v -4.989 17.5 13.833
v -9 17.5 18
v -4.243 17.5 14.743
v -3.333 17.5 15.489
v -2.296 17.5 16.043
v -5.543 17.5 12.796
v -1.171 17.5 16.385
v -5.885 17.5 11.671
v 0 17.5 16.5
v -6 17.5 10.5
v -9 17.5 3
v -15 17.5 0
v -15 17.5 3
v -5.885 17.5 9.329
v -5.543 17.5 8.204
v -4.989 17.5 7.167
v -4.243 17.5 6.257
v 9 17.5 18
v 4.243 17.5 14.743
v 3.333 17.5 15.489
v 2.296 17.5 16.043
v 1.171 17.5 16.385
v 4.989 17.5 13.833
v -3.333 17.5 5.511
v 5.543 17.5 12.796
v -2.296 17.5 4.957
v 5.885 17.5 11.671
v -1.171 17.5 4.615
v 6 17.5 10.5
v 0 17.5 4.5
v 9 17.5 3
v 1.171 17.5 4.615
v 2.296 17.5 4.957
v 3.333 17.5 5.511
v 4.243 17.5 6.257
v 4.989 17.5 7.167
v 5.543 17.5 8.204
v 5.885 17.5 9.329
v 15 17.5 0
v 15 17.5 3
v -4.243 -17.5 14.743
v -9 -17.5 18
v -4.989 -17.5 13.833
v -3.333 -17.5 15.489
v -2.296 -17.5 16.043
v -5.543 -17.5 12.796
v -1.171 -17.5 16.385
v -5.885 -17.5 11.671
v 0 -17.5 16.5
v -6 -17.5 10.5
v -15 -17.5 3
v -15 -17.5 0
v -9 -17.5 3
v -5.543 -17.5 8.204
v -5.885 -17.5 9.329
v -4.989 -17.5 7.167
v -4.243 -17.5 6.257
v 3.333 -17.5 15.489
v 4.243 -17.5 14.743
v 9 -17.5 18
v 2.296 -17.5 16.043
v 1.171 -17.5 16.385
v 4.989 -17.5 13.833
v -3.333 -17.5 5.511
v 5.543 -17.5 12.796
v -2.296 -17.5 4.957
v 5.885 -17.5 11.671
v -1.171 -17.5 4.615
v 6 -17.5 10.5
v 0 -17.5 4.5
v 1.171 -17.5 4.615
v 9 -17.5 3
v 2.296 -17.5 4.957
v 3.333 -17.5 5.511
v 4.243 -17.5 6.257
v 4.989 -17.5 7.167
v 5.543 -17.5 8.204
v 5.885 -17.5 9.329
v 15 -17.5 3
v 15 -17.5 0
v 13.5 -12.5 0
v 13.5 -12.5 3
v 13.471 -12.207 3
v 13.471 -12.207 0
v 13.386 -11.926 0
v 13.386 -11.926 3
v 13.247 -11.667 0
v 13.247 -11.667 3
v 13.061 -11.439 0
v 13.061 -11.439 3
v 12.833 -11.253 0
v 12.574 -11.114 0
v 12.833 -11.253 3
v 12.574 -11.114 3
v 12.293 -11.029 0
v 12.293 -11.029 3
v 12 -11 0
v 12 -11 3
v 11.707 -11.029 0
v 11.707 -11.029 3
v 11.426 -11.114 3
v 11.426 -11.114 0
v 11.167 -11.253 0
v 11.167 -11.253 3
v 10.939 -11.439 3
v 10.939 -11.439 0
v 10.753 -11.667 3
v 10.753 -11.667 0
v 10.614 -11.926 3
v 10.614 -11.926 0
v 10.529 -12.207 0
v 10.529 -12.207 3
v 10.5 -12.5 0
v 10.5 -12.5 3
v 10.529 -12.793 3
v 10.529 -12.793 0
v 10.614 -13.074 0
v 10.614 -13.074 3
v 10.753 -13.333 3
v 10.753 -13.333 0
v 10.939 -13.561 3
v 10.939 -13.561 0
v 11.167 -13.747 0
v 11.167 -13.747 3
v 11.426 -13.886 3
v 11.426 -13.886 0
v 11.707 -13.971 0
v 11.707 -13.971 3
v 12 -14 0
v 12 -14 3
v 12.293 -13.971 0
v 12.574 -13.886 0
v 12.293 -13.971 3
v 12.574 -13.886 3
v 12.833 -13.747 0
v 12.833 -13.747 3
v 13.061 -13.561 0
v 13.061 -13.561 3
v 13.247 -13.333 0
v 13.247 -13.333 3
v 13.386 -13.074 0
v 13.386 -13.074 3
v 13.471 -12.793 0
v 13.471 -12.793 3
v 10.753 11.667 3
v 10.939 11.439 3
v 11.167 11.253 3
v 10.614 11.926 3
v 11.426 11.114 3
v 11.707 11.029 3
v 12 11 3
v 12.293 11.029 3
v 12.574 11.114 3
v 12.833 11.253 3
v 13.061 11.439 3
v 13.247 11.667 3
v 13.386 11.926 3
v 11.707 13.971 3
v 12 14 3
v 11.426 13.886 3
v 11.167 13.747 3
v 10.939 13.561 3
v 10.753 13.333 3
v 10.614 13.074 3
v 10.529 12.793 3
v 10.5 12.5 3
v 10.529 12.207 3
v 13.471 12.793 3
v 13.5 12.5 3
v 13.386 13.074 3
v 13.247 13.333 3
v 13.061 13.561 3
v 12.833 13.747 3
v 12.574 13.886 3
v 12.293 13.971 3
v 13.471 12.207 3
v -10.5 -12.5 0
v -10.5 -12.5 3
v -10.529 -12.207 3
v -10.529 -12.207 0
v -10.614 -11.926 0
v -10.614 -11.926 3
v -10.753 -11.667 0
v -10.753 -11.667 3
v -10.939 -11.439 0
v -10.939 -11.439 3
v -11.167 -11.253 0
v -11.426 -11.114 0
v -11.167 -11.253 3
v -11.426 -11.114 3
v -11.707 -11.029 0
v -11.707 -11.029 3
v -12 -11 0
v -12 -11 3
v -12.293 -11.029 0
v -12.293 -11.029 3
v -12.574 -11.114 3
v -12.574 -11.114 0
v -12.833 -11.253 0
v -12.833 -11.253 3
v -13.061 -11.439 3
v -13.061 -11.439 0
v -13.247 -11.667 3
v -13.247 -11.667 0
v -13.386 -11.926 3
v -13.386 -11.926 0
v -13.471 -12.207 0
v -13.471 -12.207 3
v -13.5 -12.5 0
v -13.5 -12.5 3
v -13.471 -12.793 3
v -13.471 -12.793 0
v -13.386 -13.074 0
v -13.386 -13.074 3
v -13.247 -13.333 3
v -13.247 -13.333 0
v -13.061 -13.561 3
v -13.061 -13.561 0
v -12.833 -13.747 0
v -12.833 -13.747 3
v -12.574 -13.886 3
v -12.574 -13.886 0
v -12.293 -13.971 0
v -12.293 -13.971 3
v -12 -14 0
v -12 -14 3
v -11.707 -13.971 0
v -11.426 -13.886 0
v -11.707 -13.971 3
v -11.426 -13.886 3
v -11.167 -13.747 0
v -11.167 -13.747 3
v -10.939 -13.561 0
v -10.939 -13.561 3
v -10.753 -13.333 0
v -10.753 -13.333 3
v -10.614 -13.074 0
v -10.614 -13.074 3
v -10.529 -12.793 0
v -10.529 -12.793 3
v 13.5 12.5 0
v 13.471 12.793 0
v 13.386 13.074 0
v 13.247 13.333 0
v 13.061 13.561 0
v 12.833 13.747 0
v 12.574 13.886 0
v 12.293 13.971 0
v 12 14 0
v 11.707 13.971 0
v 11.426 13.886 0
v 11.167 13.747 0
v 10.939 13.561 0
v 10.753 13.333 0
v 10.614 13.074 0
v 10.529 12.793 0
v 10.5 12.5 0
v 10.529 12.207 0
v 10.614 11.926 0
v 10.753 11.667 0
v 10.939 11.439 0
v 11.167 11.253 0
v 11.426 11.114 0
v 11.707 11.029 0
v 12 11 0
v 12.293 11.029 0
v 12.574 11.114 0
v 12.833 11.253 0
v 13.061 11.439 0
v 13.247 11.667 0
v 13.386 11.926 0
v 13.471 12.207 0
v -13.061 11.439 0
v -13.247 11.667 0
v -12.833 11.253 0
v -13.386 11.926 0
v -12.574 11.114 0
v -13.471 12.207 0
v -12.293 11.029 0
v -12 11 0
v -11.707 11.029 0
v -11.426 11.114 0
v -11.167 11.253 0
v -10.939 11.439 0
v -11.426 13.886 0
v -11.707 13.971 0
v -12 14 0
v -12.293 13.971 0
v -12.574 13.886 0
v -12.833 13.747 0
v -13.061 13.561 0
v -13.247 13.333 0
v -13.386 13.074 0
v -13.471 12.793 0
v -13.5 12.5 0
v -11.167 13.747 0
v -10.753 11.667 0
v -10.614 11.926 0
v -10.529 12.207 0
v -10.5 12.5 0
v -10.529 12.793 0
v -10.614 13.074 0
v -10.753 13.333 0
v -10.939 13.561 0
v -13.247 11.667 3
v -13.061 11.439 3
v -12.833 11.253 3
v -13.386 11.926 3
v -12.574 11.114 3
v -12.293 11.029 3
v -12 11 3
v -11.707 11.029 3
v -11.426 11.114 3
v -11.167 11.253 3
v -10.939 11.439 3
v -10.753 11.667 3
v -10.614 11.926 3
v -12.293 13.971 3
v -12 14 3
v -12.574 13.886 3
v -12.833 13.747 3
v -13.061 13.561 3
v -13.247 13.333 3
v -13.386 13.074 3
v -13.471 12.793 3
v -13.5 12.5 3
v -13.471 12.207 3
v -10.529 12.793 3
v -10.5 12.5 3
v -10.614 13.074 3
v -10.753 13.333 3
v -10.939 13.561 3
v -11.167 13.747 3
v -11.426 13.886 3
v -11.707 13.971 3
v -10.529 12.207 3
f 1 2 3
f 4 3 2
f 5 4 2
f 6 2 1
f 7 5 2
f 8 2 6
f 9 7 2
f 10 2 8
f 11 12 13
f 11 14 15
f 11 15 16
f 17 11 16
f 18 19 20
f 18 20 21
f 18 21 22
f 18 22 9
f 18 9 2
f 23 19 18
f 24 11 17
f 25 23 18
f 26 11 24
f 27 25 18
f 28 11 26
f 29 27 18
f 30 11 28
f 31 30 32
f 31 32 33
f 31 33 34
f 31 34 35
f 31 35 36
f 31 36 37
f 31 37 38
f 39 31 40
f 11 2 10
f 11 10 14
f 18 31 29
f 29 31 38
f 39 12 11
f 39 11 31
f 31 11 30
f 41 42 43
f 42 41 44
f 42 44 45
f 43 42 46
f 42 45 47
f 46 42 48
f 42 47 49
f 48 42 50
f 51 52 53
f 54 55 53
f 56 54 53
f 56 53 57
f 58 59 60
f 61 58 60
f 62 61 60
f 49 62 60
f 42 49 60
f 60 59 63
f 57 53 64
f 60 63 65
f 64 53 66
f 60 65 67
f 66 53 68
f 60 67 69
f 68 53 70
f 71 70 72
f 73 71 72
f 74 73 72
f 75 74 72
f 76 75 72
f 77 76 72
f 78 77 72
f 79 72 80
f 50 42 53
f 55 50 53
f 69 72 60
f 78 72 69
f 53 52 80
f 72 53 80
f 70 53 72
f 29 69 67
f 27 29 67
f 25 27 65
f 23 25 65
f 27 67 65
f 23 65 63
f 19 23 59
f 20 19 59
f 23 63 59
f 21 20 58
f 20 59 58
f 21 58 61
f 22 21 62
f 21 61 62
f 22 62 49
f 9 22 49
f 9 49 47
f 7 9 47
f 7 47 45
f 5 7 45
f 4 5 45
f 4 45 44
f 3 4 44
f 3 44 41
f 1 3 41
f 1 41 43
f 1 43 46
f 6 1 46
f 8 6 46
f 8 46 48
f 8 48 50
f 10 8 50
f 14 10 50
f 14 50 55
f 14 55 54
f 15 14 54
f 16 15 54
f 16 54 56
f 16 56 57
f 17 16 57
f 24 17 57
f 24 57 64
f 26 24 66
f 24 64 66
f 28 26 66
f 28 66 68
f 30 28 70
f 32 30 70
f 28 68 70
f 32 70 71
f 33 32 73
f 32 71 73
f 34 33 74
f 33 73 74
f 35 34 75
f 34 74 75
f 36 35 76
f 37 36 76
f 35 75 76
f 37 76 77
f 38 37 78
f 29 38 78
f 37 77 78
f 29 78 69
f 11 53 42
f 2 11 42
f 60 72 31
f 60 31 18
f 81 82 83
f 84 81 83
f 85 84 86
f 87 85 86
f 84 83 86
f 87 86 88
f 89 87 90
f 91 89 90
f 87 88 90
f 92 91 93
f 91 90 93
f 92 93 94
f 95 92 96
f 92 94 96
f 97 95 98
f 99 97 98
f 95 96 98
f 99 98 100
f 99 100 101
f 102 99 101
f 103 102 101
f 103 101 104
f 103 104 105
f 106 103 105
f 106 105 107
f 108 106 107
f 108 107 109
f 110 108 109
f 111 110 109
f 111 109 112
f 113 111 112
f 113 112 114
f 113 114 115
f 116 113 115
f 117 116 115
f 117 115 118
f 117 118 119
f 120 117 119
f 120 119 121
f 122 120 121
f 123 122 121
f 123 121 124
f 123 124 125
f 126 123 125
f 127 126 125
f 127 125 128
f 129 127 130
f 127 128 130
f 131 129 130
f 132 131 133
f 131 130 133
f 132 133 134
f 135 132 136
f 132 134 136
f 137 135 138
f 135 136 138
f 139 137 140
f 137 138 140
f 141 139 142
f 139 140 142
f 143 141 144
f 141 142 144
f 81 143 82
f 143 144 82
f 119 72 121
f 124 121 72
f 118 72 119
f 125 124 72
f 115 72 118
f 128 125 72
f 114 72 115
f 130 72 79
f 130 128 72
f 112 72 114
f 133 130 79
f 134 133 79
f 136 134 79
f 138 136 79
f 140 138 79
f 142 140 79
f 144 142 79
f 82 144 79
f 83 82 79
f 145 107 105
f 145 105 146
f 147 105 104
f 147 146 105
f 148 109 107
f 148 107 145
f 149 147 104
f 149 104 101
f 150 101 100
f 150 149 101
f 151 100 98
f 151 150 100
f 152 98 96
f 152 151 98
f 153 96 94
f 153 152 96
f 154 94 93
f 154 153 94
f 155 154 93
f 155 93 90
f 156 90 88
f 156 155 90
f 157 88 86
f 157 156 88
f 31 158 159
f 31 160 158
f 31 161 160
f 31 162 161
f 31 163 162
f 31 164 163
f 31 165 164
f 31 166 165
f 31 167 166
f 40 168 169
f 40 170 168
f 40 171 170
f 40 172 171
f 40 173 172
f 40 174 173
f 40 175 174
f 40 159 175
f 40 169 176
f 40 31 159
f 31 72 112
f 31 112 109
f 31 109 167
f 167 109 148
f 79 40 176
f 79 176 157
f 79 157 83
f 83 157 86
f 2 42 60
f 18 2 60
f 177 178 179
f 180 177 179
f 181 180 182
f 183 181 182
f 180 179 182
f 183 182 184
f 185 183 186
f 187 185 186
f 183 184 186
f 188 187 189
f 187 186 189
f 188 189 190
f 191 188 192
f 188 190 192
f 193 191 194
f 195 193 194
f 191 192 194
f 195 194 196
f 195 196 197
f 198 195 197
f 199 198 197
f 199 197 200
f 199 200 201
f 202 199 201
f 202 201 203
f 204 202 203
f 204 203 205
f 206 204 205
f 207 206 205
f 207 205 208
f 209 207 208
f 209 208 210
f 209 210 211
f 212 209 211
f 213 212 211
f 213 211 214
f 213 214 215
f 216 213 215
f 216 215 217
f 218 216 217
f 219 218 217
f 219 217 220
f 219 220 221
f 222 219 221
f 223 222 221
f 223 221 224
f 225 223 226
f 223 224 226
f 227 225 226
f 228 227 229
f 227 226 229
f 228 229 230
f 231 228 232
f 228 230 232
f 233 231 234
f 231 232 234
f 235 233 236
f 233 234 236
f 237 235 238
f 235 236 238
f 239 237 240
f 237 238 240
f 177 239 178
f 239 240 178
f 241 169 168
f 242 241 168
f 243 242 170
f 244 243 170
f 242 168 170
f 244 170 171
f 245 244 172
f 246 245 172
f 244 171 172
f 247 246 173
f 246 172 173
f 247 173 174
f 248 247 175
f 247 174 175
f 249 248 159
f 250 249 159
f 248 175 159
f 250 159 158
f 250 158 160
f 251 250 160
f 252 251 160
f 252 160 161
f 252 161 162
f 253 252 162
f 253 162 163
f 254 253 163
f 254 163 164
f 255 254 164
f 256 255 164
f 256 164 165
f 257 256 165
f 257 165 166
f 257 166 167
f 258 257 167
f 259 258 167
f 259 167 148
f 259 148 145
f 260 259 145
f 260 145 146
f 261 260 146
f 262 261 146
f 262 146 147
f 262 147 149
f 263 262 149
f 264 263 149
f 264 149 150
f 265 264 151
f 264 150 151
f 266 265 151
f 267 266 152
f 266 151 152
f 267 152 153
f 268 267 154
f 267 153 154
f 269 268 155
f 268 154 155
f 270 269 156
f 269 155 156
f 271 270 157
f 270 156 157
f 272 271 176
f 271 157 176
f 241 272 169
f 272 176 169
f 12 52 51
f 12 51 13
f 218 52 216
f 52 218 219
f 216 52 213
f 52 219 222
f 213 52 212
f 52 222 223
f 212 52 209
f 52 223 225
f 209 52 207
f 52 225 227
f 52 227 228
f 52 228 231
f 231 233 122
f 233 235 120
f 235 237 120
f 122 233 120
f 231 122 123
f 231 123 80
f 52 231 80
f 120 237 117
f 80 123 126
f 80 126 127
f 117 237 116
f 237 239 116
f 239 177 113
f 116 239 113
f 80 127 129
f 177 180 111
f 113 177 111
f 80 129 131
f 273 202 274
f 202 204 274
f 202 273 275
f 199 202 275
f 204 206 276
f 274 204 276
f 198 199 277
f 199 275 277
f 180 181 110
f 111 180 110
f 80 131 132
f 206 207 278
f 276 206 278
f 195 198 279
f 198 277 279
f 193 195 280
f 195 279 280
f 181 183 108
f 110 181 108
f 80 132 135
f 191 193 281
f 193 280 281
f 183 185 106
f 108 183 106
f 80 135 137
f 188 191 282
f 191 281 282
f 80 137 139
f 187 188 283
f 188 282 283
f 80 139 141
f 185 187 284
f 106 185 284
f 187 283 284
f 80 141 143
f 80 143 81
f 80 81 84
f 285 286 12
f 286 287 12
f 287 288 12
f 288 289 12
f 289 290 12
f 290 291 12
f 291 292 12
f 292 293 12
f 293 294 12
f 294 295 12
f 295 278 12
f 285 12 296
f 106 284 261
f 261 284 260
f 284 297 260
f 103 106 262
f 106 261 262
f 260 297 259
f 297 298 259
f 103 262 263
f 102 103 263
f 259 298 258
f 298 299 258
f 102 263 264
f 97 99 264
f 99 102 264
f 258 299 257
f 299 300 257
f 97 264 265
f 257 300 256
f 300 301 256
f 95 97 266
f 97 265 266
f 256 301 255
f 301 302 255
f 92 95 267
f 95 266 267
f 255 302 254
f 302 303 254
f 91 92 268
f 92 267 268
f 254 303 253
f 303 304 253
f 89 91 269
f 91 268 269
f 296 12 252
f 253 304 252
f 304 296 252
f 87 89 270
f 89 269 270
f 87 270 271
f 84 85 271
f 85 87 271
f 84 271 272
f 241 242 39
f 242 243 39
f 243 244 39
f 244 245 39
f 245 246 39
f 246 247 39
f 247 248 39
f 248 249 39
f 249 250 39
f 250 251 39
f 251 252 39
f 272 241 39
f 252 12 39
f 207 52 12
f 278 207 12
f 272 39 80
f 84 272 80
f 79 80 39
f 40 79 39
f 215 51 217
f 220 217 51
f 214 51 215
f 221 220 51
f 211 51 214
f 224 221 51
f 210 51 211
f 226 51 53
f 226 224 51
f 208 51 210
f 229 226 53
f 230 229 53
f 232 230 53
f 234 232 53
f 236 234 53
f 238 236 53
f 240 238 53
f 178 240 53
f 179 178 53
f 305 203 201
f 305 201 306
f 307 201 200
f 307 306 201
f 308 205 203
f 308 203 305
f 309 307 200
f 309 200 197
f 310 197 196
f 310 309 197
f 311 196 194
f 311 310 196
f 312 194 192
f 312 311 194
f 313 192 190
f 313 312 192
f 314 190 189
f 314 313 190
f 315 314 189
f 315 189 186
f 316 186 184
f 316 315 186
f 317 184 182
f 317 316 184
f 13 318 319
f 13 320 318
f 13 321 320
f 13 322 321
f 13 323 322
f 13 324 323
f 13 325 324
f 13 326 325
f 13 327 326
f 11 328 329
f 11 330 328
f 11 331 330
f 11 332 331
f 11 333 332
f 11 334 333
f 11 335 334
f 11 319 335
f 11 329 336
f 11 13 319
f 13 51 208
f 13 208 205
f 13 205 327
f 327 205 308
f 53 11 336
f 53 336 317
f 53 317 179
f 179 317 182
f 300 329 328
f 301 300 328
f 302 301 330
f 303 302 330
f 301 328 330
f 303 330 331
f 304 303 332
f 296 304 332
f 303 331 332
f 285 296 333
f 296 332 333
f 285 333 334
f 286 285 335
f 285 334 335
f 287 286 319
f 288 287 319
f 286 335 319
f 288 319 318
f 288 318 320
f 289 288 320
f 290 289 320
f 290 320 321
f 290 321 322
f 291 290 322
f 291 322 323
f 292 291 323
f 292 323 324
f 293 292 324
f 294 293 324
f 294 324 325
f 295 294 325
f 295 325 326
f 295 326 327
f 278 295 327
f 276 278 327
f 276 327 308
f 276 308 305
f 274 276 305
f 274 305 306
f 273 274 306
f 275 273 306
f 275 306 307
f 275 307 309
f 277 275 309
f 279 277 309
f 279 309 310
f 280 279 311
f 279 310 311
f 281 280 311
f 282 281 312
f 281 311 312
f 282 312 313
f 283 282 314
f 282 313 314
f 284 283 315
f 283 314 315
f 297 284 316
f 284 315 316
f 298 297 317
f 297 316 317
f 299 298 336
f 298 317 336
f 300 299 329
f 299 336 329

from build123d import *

# Parameters (mm, degrees)
F0_W     = 30
F0_H     = 35
F1_DEPTH = 3
F2_W     = 18
F2_H     = 15
F3_DEPTH = 35
F4_R     = 6
F5_DEPTH = 40
F6_R     = 1.5
F7_DEPTH = 25


with BuildPart() as f1:
    # F0 (on Top) → F1 (new body)
    with BuildSketch(Plane.XY):
        Rectangle(F0_W, F0_H)
    extrude(amount=F1_DEPTH)

    # F2 (on face) → F3 (join)
    with BuildSketch(Plane.XZ.offset(17.5)):
        with Locations((0, 10.5)):
            Rectangle(F2_W, F2_H)
    extrude(amount=-F3_DEPTH)

    # F4 (on face) → F5 (cut)
    with BuildSketch(Plane.XZ.offset(17.5)):
        with Locations((0, 10.5)):
            Circle(F4_R)
    extrude(amount=-F5_DEPTH, mode=Mode.SUBTRACT)

    # F6 (on face) → F7 (cut)
    with BuildSketch(Plane.XY.offset(3)):
        with Locations((12, 12.5)):
            Circle(F6_R)
        with Locations((12, -12.5)):
            Circle(F6_R)
        with Locations((-12, -12.5)):
            Circle(F6_R)
        with Locations((-12, 12.5)):
            Circle(F6_R)
    extrude(amount=-F7_DEPTH, mode=Mode.SUBTRACT)


solid = f1.part
